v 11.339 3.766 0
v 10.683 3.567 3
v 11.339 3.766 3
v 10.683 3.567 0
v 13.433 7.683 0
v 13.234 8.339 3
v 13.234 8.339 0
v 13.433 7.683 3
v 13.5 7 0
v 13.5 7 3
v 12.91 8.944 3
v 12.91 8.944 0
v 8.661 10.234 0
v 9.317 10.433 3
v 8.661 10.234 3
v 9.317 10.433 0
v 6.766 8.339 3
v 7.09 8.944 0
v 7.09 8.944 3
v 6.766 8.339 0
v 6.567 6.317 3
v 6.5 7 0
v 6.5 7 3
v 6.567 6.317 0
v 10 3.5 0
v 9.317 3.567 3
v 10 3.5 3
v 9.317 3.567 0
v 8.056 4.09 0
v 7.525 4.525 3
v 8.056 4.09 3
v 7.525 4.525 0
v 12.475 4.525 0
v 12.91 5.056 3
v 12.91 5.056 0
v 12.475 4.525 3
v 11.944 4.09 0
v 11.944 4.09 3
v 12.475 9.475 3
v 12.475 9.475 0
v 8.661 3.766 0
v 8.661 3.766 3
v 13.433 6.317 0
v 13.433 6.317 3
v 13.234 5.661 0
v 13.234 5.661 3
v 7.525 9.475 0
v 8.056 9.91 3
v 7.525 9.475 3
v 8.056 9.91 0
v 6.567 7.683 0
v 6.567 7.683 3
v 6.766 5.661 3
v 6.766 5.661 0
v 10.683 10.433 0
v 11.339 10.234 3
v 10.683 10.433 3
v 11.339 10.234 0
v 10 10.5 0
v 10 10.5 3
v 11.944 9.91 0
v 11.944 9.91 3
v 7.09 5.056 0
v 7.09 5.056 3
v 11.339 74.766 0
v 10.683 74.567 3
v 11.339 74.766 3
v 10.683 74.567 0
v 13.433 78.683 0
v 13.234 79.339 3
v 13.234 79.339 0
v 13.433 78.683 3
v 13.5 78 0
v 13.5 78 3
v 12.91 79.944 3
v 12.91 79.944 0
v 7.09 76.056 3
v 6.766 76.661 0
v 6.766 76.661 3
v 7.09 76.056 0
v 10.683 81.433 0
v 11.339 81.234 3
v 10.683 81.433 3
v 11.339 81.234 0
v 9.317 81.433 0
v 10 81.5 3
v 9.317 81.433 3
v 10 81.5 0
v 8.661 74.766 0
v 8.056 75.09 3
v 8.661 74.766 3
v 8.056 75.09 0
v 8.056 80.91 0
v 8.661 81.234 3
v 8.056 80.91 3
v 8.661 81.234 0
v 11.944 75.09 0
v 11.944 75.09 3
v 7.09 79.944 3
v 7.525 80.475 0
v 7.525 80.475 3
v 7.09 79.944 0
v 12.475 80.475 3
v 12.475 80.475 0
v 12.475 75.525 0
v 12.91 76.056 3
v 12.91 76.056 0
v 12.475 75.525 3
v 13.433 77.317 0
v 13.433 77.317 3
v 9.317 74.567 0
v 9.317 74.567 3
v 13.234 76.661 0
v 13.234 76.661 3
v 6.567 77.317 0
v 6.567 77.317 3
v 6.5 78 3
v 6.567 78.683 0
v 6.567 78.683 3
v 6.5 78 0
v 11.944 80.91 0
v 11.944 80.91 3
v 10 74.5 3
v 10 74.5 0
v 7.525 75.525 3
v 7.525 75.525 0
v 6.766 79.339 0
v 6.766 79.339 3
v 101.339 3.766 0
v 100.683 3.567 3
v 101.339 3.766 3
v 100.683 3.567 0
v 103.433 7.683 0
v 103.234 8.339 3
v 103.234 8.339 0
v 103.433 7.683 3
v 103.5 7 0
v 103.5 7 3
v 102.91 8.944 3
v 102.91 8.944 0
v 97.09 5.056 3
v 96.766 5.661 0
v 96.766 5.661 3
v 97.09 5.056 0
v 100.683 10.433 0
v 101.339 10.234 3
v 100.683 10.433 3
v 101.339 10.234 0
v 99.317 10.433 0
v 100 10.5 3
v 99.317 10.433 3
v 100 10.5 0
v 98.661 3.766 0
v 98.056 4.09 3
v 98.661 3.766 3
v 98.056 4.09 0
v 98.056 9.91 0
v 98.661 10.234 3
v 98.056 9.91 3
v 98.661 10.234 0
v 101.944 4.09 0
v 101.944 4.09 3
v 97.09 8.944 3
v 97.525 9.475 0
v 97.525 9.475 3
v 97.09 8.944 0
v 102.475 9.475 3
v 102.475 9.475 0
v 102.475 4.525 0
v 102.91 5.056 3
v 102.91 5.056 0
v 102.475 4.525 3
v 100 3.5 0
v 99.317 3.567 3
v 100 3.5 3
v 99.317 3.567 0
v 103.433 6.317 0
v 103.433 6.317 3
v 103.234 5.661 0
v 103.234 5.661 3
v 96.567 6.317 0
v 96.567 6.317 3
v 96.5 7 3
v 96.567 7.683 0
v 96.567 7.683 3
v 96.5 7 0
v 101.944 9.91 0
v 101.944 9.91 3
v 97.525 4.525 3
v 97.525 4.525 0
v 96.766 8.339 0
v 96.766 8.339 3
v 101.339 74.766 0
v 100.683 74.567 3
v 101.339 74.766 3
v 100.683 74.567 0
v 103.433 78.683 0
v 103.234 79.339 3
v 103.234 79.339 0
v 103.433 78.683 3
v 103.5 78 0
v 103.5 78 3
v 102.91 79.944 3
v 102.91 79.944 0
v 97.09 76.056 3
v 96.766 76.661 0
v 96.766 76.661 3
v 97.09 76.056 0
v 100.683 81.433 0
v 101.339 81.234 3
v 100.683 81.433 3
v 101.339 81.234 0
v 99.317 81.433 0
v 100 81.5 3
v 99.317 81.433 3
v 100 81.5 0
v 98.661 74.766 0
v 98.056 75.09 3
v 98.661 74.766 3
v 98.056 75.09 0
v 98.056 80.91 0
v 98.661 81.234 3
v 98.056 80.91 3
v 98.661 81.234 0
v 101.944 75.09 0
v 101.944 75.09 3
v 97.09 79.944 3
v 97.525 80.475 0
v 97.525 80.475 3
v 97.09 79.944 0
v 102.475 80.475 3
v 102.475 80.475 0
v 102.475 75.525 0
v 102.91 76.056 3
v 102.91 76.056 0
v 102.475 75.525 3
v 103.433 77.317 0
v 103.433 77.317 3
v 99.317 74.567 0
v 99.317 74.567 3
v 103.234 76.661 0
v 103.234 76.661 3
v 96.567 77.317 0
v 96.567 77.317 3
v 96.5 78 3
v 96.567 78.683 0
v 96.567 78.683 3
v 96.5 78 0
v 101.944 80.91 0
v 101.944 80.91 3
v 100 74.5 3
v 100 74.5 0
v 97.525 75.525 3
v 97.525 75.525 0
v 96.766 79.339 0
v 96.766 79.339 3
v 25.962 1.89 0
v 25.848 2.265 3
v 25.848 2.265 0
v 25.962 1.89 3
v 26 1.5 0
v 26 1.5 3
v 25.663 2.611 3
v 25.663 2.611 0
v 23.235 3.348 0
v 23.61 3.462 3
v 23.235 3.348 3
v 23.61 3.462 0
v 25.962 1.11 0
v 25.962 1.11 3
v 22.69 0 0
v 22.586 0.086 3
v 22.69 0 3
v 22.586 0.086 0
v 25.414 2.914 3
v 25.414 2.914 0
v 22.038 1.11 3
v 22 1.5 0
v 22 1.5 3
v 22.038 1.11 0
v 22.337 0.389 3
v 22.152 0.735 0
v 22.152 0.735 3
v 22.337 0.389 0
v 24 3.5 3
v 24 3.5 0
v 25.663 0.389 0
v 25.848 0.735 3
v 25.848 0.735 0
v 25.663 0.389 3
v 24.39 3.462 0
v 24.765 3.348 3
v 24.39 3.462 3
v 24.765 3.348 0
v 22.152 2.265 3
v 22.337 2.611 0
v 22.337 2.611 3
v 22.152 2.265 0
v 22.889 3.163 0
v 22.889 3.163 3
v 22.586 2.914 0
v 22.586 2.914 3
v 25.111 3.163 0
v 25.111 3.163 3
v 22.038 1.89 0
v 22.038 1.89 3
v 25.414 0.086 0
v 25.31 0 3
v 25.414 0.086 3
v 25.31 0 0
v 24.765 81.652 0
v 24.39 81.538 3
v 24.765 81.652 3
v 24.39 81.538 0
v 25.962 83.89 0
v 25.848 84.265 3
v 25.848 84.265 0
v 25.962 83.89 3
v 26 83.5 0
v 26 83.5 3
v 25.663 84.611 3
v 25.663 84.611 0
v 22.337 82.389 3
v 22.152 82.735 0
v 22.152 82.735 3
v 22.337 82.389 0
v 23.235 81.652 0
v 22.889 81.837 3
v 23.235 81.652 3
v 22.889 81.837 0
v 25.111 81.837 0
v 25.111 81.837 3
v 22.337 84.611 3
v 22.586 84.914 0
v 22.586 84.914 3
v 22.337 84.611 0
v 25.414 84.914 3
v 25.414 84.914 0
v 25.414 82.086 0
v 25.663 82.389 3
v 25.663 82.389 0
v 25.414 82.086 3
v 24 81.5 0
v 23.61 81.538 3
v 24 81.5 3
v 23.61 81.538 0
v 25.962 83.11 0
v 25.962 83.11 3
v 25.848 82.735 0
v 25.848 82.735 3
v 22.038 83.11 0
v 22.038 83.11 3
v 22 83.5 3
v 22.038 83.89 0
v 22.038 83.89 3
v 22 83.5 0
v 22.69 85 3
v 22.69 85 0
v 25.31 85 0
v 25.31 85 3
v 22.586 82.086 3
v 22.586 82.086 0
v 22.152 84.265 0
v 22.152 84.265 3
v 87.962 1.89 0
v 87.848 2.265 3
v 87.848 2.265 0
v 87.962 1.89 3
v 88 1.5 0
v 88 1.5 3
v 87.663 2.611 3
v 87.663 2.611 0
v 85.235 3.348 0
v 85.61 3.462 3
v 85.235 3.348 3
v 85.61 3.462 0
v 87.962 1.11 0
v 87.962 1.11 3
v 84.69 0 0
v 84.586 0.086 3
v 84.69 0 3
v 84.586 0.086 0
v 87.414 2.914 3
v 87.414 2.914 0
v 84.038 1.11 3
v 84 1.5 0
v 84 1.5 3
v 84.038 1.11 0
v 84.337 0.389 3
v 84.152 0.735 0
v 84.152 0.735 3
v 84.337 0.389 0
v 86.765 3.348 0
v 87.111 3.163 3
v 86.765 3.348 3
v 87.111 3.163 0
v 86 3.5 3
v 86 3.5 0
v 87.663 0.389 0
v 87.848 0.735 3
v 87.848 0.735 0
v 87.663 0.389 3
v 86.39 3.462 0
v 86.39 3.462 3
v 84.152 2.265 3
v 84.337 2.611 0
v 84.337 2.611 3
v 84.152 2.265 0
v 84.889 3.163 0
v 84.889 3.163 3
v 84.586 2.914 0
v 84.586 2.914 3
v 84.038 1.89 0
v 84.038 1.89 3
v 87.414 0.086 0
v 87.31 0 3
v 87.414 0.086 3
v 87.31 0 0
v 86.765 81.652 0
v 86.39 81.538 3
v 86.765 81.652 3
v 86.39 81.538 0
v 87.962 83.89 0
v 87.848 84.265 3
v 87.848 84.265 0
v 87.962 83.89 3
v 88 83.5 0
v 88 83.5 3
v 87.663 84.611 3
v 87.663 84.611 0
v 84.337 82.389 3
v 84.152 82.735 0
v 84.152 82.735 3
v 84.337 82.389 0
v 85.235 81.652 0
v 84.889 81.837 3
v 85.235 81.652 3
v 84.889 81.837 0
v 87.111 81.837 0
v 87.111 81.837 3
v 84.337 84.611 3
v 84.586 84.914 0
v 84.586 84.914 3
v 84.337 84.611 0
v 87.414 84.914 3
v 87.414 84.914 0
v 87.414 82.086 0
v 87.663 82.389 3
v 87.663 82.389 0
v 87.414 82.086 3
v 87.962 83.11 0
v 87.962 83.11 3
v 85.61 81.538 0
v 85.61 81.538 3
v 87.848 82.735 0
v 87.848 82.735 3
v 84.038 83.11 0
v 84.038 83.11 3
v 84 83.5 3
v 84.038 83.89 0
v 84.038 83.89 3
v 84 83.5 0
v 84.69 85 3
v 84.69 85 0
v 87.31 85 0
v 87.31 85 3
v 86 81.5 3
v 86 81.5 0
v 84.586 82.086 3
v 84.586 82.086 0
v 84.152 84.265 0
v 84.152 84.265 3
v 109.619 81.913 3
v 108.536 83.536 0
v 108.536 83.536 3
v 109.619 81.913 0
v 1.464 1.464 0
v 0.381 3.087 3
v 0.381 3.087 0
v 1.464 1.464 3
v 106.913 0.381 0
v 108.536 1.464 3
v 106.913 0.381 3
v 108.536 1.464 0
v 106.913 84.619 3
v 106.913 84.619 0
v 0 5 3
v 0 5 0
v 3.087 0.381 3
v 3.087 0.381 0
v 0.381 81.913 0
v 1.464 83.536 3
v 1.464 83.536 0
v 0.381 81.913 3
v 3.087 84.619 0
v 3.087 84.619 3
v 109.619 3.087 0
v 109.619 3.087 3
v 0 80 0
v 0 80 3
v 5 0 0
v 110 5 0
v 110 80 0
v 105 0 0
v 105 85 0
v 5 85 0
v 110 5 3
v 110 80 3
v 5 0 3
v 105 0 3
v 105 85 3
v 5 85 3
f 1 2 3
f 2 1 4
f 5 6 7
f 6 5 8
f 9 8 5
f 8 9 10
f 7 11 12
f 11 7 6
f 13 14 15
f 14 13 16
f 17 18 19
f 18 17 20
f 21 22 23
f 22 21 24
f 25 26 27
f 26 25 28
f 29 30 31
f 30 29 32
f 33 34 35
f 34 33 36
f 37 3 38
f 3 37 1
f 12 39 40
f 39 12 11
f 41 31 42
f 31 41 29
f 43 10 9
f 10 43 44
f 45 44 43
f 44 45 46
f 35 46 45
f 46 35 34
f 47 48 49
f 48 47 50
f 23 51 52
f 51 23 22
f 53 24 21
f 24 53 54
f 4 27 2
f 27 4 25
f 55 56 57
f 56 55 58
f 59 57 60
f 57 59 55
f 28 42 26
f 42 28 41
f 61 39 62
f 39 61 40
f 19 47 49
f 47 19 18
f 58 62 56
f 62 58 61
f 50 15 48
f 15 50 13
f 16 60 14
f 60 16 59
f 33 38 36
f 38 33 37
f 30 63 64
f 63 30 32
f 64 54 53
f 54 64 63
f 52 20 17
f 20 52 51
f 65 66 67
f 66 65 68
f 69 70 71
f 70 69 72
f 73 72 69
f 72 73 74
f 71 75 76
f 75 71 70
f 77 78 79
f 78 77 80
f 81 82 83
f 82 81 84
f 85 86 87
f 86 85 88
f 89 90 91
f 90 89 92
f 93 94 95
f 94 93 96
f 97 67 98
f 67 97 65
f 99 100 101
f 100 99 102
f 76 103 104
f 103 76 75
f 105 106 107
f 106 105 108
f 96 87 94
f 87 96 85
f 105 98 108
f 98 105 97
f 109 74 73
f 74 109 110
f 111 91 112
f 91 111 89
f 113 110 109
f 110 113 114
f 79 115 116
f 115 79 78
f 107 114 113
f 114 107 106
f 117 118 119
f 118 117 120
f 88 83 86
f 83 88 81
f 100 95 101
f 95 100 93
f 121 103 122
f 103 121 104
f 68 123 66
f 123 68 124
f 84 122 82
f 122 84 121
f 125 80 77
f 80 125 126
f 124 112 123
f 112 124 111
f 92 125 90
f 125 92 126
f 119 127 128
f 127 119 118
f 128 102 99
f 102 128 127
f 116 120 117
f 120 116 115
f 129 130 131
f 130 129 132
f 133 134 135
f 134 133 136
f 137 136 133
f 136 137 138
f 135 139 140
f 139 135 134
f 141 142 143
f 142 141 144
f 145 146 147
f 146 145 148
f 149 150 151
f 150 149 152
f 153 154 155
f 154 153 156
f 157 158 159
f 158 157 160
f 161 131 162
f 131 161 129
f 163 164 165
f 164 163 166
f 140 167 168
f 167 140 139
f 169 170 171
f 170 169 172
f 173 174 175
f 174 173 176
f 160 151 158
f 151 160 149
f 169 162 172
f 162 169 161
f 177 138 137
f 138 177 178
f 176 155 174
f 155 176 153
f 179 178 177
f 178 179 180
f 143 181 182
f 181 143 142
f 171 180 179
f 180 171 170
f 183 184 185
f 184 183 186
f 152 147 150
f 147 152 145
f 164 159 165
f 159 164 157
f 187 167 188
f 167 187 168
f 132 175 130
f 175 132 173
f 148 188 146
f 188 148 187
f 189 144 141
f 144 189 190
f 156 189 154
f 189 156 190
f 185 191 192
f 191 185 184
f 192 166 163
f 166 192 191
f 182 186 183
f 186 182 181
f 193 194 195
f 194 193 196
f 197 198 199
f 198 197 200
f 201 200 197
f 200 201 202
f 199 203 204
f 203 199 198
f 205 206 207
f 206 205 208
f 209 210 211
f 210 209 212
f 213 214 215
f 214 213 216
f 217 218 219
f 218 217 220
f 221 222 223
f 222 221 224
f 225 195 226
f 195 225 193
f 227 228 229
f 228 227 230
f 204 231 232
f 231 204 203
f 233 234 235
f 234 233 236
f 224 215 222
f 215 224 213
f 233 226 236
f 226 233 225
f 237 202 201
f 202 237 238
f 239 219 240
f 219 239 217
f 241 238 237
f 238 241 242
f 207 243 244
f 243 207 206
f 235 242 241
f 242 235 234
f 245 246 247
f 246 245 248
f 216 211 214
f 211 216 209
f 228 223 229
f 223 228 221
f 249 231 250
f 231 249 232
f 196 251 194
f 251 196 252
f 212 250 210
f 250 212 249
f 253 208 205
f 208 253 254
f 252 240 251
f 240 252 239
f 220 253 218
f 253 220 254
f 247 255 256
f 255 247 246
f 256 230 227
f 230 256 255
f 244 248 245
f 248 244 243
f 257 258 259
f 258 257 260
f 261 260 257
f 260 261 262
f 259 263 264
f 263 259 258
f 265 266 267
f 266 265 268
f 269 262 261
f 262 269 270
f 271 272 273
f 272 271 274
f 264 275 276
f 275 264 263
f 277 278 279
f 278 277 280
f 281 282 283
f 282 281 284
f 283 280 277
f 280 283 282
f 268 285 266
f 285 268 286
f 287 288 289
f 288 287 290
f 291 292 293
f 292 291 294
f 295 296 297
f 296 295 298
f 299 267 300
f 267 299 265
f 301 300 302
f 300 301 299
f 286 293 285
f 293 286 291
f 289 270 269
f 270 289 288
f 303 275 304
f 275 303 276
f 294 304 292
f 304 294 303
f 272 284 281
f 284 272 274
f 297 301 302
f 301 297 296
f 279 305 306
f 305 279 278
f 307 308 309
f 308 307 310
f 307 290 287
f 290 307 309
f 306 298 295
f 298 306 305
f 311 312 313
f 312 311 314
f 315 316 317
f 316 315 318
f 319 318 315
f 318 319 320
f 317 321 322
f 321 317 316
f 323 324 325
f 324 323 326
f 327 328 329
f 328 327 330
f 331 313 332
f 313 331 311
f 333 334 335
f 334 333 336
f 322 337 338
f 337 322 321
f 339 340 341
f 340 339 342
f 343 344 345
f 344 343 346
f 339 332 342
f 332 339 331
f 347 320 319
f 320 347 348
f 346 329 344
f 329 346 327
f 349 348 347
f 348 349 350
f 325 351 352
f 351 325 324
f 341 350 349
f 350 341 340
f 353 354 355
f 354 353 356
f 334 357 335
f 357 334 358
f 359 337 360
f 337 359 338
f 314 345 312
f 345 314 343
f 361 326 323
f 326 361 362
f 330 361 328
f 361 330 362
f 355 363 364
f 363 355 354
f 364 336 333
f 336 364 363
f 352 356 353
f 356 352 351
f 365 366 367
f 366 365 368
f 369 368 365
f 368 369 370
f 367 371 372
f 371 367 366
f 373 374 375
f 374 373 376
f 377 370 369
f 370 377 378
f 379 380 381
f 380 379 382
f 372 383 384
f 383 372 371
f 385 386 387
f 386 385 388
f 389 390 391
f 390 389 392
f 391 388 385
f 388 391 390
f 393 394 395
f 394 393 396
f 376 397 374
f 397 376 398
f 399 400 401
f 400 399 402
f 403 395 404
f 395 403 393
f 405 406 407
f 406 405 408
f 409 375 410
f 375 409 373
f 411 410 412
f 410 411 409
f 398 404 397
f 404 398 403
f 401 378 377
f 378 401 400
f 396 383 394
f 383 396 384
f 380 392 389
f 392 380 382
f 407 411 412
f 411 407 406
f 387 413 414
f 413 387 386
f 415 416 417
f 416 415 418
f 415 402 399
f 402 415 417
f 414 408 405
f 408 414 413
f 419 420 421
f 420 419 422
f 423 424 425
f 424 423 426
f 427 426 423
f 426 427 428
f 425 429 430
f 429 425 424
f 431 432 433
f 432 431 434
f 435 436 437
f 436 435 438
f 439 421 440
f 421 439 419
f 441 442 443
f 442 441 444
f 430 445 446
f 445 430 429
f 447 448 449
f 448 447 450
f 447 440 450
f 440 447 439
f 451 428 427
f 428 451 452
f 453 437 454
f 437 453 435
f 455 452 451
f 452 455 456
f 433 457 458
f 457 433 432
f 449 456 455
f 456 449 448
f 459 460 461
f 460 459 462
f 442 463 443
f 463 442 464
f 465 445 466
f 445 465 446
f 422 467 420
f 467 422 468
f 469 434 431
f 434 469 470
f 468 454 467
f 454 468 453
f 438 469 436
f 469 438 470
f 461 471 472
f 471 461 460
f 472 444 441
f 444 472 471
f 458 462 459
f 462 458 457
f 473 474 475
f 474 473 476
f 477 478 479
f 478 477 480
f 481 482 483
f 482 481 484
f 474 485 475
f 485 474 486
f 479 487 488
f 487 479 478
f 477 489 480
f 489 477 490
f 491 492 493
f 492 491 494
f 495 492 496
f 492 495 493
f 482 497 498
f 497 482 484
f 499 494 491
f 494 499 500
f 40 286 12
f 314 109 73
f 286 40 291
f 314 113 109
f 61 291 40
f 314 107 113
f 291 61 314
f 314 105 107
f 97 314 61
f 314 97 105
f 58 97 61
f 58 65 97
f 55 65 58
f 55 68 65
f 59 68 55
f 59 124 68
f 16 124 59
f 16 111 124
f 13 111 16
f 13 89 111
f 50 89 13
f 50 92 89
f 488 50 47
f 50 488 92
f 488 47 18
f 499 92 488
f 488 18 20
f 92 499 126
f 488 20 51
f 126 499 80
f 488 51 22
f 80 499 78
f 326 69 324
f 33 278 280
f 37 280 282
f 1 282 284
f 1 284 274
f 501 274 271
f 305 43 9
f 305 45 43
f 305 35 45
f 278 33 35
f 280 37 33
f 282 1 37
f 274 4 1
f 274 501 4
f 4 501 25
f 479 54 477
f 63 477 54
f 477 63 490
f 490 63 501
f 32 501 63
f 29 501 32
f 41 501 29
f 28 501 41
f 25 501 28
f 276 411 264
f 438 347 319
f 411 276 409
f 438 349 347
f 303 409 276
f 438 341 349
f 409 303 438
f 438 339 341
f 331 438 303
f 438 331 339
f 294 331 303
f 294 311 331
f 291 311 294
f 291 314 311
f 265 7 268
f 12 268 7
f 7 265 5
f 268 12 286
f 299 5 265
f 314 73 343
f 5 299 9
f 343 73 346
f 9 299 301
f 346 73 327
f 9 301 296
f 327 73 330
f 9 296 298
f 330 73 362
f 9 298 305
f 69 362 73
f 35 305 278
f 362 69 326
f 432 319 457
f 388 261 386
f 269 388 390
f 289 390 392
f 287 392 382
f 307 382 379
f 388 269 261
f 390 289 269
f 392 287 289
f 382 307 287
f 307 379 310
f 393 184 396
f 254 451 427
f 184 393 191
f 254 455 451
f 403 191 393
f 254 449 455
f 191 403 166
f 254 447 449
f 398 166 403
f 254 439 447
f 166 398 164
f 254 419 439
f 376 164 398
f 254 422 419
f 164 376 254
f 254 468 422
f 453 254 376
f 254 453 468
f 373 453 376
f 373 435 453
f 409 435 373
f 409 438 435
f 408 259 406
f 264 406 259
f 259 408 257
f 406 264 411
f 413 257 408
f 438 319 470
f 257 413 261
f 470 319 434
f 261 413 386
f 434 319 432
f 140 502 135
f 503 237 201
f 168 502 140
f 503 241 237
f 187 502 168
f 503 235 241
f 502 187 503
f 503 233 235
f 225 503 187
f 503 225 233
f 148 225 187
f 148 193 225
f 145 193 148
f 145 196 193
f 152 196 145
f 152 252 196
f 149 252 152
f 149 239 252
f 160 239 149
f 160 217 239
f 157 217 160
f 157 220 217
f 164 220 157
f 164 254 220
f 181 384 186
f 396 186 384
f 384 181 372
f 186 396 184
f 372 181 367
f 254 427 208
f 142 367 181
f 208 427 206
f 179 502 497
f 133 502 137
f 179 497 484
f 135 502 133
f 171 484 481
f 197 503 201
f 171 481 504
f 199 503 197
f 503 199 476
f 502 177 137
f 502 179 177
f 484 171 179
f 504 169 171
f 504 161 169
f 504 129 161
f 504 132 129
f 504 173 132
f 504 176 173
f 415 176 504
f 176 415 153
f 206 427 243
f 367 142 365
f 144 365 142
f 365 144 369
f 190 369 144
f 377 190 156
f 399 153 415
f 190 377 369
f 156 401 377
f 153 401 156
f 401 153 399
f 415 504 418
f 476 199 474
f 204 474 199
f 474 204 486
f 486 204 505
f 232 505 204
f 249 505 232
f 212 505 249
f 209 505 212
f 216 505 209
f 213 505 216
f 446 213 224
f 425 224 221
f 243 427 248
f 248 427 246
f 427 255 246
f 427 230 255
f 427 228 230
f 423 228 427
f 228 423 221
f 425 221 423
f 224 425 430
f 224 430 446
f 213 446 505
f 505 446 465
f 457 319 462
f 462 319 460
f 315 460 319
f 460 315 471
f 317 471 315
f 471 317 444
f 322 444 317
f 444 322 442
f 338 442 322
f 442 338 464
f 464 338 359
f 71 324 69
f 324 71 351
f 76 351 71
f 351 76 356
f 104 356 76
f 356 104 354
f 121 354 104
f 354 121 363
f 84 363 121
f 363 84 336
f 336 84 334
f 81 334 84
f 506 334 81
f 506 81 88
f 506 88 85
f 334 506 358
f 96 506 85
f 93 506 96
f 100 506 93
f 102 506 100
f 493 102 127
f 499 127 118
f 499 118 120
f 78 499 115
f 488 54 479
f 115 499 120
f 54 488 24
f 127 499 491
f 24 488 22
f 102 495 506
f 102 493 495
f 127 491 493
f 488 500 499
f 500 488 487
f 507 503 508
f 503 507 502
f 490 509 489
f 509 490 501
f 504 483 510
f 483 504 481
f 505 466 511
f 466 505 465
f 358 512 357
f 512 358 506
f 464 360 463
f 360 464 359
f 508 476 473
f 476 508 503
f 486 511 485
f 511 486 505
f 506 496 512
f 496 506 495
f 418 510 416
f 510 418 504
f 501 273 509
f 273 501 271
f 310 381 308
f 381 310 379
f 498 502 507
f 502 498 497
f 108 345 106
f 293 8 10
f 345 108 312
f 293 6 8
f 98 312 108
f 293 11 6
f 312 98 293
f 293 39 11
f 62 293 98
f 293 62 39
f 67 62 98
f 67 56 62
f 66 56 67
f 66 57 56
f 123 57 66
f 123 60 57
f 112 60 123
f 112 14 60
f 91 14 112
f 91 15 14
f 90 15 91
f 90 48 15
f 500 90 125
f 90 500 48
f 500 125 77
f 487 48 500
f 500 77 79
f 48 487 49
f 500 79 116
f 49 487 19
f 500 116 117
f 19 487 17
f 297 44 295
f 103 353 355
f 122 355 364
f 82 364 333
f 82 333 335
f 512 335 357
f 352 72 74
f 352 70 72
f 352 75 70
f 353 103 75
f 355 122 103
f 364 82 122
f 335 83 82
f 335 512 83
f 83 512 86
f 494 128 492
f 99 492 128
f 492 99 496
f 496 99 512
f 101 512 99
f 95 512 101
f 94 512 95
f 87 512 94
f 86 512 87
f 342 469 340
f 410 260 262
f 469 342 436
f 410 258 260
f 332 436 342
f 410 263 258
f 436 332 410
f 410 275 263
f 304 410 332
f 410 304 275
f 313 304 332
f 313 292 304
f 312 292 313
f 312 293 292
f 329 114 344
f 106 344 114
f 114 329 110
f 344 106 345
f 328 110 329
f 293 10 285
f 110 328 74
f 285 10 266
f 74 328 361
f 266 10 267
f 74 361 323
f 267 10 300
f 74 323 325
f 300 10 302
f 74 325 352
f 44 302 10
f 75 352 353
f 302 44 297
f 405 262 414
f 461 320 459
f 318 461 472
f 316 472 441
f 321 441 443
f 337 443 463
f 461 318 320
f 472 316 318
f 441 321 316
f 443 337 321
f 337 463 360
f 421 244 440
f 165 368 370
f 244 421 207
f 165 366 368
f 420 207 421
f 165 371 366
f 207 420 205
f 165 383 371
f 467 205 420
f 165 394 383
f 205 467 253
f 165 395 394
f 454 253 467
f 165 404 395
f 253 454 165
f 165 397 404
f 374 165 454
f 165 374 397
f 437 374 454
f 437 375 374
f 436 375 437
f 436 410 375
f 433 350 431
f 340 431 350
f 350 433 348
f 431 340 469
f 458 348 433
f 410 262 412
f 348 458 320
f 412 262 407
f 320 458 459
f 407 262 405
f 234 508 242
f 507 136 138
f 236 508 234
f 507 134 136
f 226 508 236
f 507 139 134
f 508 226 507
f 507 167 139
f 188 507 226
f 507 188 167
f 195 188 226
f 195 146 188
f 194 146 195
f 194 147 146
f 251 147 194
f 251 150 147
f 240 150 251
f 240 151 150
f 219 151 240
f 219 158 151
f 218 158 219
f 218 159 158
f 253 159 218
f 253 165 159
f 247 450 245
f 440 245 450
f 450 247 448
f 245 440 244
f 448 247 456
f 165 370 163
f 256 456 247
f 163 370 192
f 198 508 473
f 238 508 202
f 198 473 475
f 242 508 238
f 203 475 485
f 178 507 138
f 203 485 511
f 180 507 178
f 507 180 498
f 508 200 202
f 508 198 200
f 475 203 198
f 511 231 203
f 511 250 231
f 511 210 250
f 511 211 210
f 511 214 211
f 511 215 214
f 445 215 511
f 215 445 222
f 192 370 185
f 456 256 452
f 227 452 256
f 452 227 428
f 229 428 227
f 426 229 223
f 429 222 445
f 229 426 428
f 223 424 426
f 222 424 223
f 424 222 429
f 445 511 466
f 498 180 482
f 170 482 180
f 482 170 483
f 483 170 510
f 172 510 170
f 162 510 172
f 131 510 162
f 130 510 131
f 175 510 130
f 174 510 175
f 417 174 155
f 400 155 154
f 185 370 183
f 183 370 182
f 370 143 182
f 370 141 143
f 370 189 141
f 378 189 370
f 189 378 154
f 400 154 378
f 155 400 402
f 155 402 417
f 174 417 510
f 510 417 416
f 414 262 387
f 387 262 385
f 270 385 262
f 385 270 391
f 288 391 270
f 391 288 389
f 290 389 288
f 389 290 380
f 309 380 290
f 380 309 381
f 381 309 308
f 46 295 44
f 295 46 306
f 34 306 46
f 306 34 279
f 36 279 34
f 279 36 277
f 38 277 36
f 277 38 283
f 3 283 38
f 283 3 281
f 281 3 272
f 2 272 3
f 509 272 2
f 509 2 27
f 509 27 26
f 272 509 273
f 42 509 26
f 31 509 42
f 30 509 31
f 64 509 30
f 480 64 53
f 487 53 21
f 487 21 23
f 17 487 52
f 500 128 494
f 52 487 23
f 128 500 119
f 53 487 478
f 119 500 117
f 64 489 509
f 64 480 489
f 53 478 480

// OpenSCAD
// Main dimensions
plate_width = 110;
plate_height = 85;
plate_thickness = 3;
corner_radius = 5;

// Corner holes
corner_hole_diameter = 7;
corner_holes_width = 90;
corner_holes_height = 71;

// Center holes
center_hole_diameter = 4;
center_holes_width = 62;  // Changed from 82 to 62
center_holes_height = 82; // Changed from 62 to 82

module roundedRect(width, height, radius) {
    hull() {
        translate([radius, radius, 0])
        circle(r=radius);
        
        translate([width-radius, radius, 0])
        circle(r=radius);
        
        translate([radius, height-radius, 0])
        circle(r=radius);
        
        translate([width-radius, height-radius, 0])
        circle(r=radius);
    }
}

// Create the base plate with rounded corners
difference() {
    // Main plate
    linear_extrude(height=plate_thickness)
    roundedRect(plate_width, plate_height, corner_radius);
    
    // Corner holes
    for(x = [0,1], y = [0,1]) {
        translate([
            (plate_width - corner_holes_width)/2 + x*corner_holes_width,
            (plate_height - corner_holes_height)/2 + y*corner_holes_height,
            -1
        ])
        cylinder(d=corner_hole_diameter, h=plate_thickness+2, $fn=32);
    }
    
    // Center holes
    for(x = [0,1], y = [0,1]) {
        translate([
            (plate_width - center_holes_width)/2 + x*center_holes_width,
            (plate_height - center_holes_height)/2 + y*center_holes_height,
            -1
        ])
        cylinder(d=center_hole_diameter, h=plate_thickness+2, $fn=32);
    }
}
